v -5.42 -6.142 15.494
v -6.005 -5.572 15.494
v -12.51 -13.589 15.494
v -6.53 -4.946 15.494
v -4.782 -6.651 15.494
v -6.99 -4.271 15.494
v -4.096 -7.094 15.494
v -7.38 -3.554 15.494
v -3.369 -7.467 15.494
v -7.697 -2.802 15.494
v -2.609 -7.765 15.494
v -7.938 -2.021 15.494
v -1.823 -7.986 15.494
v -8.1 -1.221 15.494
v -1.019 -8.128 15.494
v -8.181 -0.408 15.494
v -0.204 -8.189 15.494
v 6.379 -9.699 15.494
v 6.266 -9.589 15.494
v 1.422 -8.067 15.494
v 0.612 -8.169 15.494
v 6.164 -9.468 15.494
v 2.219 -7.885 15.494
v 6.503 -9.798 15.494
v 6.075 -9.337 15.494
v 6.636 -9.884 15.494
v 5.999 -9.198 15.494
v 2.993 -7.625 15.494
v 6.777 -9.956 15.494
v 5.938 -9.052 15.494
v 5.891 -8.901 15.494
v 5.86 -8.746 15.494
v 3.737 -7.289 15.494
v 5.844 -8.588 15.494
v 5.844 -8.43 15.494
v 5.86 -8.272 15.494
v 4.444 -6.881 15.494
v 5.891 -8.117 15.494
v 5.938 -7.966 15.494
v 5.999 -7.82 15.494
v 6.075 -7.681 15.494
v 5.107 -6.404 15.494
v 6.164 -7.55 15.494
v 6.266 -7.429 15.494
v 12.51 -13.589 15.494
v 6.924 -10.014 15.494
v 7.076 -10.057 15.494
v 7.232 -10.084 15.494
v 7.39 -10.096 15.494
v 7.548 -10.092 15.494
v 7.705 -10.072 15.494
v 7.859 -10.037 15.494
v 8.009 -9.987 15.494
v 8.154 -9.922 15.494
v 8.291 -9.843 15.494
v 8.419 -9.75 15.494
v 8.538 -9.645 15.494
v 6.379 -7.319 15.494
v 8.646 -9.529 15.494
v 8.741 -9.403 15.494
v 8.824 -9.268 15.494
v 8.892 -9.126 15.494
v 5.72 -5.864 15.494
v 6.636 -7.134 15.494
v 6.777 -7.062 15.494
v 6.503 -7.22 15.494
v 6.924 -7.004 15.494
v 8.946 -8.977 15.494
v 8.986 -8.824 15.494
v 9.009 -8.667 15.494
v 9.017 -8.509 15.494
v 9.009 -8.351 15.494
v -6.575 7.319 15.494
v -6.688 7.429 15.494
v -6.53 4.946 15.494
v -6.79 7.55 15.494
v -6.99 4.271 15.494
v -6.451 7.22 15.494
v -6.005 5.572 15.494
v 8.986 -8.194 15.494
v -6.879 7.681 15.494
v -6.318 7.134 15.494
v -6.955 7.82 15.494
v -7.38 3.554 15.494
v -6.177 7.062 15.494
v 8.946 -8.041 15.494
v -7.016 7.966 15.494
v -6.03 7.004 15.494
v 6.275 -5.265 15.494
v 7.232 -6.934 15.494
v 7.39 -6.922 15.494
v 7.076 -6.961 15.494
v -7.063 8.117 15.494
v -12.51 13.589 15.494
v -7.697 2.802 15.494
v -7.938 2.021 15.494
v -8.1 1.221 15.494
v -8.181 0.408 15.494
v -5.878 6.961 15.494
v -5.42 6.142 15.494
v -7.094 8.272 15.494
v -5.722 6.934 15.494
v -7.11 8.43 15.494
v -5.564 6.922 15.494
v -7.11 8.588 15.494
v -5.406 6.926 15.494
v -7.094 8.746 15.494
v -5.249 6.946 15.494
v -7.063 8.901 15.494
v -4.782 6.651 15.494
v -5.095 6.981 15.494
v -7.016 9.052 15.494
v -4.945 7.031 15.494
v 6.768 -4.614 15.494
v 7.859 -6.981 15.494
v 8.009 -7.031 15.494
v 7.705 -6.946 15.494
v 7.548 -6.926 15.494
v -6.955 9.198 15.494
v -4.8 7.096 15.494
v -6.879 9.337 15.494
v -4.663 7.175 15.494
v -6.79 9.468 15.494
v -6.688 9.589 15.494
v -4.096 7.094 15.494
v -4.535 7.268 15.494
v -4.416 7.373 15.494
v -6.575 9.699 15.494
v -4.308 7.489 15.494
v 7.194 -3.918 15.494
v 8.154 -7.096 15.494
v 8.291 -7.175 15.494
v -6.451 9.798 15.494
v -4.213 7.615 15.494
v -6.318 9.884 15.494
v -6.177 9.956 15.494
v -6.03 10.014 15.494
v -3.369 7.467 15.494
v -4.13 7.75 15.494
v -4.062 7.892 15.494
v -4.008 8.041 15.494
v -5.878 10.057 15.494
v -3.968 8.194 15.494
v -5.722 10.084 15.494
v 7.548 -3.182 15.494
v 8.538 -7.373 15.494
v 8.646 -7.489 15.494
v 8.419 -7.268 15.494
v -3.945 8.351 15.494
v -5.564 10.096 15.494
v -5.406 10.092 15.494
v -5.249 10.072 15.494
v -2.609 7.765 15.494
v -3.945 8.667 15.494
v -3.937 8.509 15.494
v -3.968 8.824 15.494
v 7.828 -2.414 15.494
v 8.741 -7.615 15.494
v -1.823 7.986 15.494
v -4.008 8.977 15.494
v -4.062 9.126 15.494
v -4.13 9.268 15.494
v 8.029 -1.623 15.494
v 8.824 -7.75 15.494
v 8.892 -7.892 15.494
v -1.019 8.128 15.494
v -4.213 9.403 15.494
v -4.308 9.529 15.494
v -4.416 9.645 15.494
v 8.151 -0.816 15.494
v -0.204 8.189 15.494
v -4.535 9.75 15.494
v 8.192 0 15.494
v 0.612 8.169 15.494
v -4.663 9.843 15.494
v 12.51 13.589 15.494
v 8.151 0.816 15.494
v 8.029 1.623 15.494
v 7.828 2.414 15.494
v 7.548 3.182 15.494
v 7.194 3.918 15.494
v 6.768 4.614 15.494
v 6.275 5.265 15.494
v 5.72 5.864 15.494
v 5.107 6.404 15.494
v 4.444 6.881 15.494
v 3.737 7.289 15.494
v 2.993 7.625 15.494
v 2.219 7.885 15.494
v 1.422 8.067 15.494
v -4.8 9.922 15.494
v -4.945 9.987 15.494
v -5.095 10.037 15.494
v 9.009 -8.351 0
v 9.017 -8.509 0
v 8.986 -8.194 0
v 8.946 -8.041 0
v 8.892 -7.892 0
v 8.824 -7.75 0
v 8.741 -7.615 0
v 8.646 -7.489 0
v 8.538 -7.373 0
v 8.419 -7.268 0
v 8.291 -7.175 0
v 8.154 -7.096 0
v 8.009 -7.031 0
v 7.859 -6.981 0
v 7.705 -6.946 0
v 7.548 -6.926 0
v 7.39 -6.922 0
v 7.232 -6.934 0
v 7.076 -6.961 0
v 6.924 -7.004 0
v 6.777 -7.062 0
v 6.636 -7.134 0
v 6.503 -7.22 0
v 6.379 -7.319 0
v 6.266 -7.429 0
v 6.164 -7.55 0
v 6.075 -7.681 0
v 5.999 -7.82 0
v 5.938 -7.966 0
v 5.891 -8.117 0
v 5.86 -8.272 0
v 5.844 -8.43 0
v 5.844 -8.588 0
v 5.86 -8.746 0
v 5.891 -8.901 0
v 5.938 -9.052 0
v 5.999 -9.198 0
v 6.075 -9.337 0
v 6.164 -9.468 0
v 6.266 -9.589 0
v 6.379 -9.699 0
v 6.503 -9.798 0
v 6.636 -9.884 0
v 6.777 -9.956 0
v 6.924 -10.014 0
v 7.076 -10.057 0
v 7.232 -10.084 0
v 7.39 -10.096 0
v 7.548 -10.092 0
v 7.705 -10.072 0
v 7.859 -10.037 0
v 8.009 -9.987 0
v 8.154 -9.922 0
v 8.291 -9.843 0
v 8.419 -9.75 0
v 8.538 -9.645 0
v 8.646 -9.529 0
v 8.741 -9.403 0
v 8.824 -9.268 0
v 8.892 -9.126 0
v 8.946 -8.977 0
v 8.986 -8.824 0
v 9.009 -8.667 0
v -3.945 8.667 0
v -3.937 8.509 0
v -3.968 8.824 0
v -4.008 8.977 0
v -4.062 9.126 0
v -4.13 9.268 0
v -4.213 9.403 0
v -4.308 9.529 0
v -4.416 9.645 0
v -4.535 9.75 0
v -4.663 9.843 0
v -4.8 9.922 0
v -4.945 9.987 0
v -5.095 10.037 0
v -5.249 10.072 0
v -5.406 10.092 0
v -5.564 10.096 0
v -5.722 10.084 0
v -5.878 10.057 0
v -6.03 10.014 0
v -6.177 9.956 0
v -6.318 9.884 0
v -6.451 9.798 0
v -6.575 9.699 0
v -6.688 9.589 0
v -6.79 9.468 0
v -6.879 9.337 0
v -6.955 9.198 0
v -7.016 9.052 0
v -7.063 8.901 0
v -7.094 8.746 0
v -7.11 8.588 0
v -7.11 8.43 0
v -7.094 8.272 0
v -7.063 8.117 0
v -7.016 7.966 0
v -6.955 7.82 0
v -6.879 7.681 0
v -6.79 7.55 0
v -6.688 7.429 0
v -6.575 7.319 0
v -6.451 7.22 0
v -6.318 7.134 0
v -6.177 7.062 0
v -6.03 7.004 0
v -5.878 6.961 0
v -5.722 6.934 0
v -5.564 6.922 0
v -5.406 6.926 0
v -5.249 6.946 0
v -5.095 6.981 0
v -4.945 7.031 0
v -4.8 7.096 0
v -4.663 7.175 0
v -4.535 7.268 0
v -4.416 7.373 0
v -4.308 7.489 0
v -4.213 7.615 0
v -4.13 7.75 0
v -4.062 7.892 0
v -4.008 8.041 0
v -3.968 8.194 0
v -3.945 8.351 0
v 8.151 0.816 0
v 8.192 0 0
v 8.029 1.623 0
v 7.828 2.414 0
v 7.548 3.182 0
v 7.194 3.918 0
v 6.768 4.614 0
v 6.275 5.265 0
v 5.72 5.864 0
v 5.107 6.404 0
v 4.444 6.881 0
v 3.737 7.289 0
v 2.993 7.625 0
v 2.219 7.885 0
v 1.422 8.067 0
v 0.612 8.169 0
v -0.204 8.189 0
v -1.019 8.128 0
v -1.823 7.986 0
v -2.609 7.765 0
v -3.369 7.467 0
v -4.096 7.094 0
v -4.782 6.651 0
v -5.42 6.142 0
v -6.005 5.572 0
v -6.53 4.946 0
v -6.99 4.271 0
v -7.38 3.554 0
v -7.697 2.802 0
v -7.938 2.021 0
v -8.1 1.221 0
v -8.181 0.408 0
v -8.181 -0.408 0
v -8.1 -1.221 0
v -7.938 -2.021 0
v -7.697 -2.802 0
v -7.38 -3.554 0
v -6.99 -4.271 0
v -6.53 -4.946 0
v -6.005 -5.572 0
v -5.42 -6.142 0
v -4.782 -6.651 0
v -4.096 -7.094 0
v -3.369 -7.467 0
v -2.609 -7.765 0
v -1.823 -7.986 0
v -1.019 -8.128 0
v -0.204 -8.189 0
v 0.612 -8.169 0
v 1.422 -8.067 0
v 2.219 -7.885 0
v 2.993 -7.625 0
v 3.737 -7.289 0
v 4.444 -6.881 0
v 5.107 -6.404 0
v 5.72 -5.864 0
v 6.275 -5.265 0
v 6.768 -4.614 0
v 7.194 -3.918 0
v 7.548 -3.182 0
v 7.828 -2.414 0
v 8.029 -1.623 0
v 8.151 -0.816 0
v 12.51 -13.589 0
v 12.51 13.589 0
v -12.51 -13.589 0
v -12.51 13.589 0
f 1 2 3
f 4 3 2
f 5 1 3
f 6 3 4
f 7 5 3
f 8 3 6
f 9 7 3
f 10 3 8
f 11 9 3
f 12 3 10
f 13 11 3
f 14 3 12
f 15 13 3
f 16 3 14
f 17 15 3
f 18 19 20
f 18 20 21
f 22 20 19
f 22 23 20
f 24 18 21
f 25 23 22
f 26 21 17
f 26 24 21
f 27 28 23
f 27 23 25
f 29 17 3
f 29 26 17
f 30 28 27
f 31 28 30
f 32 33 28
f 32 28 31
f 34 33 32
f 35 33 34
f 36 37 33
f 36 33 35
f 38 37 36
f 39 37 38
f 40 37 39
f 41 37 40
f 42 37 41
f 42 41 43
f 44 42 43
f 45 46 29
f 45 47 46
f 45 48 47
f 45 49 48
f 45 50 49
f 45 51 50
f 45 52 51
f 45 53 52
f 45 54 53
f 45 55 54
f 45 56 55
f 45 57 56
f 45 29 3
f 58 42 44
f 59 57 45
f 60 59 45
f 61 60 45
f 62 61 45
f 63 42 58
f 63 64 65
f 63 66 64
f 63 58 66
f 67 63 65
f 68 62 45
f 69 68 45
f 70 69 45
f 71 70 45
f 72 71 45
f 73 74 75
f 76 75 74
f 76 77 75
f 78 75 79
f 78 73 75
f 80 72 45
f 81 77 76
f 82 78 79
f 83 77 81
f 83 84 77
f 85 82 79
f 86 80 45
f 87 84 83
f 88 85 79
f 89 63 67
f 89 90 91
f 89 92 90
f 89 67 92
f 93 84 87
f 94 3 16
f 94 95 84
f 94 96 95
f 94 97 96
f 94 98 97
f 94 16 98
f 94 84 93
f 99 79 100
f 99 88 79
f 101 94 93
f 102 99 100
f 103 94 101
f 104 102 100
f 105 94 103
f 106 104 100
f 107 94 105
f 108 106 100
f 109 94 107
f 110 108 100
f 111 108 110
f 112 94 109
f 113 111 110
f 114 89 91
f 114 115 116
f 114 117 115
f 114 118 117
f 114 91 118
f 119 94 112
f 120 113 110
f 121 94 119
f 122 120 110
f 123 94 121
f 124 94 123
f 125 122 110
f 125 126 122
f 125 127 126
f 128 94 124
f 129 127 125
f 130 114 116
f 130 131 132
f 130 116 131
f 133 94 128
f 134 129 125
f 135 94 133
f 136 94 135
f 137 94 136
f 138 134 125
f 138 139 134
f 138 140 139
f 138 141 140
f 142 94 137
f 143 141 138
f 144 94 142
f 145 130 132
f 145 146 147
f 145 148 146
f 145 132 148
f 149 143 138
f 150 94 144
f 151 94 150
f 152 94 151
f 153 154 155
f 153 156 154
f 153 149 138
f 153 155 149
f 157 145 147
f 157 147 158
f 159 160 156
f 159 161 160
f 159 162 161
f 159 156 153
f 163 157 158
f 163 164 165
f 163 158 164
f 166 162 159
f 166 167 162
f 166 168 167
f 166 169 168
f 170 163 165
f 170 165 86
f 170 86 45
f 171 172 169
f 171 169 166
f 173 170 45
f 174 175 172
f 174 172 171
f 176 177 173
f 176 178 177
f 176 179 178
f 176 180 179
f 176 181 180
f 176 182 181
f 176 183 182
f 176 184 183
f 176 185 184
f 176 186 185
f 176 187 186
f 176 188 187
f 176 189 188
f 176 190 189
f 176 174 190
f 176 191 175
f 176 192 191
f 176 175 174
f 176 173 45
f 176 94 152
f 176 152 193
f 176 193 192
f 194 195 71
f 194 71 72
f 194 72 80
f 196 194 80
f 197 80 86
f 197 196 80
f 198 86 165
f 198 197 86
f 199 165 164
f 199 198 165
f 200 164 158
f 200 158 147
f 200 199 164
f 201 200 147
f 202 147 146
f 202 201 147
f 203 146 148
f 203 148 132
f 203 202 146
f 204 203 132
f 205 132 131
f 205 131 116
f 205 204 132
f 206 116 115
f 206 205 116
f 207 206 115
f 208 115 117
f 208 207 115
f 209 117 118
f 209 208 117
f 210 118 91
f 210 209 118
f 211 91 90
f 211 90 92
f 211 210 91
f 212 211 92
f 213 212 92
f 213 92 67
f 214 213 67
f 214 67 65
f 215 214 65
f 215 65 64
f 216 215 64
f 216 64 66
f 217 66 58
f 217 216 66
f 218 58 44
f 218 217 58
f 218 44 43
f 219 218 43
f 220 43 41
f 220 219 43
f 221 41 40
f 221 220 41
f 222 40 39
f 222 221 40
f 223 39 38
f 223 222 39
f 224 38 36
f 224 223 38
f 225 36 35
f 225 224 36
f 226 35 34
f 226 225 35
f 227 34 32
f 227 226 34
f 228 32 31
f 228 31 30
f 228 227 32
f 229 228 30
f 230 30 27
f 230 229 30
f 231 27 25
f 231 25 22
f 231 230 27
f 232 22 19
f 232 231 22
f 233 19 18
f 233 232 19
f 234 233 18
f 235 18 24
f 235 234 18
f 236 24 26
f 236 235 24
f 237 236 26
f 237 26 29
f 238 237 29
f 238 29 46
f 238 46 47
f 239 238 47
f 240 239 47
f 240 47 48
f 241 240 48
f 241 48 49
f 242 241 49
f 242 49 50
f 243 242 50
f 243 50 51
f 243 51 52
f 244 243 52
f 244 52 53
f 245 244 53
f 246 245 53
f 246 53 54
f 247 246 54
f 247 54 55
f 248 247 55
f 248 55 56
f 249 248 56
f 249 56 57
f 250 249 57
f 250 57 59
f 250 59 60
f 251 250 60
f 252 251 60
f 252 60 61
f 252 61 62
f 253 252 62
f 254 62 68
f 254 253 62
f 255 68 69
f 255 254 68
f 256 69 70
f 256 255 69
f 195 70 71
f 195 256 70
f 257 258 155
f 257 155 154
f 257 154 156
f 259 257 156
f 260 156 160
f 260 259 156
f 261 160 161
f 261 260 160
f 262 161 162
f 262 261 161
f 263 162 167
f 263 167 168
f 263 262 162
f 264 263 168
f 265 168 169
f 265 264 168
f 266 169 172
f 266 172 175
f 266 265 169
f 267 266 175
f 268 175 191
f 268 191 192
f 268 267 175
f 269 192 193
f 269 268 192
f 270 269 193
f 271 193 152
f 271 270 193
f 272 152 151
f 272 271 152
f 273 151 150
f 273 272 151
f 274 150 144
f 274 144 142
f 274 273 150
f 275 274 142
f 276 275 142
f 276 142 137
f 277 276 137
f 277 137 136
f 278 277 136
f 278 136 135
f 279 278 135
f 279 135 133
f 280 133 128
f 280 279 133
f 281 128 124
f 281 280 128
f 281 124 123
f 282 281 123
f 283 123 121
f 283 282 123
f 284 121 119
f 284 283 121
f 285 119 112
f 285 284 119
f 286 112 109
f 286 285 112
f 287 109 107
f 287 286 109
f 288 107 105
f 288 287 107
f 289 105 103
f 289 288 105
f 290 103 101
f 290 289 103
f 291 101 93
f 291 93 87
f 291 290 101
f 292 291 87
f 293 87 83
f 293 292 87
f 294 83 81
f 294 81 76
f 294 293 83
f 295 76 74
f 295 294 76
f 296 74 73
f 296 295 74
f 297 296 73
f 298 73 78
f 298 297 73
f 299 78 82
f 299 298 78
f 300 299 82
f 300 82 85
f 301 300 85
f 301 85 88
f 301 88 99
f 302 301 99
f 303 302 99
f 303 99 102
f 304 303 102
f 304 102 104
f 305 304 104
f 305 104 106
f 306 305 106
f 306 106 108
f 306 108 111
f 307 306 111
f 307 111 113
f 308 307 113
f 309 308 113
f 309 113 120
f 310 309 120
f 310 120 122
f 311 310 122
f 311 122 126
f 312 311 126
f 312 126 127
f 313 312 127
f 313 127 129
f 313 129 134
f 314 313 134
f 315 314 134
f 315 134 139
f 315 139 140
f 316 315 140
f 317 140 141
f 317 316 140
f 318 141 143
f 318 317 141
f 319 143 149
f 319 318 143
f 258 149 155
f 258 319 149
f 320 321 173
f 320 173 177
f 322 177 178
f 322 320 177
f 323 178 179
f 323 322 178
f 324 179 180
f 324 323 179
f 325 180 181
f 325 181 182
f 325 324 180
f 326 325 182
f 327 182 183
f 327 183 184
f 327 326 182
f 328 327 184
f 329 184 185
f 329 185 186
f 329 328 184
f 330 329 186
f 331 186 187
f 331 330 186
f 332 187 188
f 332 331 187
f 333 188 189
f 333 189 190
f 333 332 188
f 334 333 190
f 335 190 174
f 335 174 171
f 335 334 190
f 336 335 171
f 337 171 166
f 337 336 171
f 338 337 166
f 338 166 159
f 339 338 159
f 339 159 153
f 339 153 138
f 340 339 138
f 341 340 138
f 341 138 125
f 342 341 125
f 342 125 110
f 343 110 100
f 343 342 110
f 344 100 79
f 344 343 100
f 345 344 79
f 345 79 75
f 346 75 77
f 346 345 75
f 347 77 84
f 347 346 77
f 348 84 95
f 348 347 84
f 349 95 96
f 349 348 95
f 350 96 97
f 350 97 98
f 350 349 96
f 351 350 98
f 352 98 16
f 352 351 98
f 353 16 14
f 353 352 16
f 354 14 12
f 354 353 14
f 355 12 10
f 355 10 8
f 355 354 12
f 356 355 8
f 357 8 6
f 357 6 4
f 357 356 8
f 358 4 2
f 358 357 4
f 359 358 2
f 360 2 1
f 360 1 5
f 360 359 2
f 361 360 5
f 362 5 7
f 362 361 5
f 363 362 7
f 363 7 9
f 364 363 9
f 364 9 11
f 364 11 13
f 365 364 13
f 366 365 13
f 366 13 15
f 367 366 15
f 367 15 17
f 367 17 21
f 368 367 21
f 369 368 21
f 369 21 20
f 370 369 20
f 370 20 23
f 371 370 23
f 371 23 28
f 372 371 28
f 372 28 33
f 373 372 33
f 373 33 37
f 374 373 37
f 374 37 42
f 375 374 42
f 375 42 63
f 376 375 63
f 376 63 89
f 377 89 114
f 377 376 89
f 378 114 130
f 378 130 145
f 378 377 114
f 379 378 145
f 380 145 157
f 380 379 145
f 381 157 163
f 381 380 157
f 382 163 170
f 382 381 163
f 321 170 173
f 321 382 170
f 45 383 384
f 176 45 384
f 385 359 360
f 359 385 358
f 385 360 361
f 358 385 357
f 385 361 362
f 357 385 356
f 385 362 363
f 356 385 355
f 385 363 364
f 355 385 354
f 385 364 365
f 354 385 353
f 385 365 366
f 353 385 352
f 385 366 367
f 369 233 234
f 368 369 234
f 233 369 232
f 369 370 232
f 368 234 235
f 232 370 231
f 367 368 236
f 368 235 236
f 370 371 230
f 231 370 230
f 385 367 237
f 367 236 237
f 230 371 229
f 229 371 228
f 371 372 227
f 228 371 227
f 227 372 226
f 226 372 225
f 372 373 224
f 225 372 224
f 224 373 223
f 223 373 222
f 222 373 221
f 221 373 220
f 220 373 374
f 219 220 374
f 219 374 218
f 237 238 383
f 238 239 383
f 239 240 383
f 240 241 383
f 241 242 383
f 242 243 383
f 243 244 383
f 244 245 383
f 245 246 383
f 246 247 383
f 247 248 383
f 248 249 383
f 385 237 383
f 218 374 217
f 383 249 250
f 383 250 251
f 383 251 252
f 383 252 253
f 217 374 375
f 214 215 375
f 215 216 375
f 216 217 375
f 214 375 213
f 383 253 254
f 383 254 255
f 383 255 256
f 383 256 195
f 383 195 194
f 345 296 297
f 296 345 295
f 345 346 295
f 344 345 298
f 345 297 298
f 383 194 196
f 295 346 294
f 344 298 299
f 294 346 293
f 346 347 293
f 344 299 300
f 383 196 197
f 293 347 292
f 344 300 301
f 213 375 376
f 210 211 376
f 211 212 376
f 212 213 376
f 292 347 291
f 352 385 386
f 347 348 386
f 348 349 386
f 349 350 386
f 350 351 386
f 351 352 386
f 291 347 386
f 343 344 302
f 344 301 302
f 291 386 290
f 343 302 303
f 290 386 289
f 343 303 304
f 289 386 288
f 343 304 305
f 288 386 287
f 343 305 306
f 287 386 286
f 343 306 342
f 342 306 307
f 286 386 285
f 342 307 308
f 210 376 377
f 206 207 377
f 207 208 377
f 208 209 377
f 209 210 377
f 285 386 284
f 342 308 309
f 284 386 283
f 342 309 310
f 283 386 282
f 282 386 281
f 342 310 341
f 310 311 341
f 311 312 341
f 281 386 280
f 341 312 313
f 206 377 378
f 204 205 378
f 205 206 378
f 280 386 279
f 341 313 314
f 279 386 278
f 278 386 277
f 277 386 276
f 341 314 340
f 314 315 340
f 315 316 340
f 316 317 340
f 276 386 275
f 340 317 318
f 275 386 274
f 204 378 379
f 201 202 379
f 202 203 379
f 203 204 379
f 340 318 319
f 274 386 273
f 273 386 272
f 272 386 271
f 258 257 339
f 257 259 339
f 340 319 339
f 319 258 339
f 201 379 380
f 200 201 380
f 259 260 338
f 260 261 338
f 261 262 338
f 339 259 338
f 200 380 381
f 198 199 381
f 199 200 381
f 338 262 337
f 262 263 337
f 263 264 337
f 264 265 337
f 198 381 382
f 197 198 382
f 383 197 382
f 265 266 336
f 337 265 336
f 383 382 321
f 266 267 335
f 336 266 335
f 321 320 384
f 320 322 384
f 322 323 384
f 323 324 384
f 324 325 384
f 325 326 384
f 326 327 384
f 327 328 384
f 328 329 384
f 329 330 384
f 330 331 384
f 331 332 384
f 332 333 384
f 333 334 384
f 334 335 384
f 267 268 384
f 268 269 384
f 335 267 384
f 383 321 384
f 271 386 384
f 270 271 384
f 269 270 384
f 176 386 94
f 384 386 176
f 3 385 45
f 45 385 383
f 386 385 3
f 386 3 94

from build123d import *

# Parameters (mm, degrees)
F0_W     = 25.019
F0_H     = 27.178
F0_W_2   = 19.939
F0_H_2   = 22.098
F0_R     = 1.5875
F0_R_2   = 8.1915
F1_DEPTH = 15.494


with BuildPart() as f1:
    # F0 (on Top) → F1 (new body)
    with BuildSketch(Plane.XY):
        Rectangle(F0_W, F0_H)
        Rectangle(F0_W_2, F0_H_2, mode=Mode.SUBTRACT)
        Rectangle(F0_W_2, F0_H_2)
        with Locations((7.4295, -8.509)):
            Circle(F0_R, mode=Mode.SUBTRACT)
        with Locations((-5.5245, 8.509)):
            Circle(F0_R, mode=Mode.SUBTRACT)
        Circle(F0_R_2, mode=Mode.SUBTRACT)
    extrude(amount=F1_DEPTH)


solid = f1.part
